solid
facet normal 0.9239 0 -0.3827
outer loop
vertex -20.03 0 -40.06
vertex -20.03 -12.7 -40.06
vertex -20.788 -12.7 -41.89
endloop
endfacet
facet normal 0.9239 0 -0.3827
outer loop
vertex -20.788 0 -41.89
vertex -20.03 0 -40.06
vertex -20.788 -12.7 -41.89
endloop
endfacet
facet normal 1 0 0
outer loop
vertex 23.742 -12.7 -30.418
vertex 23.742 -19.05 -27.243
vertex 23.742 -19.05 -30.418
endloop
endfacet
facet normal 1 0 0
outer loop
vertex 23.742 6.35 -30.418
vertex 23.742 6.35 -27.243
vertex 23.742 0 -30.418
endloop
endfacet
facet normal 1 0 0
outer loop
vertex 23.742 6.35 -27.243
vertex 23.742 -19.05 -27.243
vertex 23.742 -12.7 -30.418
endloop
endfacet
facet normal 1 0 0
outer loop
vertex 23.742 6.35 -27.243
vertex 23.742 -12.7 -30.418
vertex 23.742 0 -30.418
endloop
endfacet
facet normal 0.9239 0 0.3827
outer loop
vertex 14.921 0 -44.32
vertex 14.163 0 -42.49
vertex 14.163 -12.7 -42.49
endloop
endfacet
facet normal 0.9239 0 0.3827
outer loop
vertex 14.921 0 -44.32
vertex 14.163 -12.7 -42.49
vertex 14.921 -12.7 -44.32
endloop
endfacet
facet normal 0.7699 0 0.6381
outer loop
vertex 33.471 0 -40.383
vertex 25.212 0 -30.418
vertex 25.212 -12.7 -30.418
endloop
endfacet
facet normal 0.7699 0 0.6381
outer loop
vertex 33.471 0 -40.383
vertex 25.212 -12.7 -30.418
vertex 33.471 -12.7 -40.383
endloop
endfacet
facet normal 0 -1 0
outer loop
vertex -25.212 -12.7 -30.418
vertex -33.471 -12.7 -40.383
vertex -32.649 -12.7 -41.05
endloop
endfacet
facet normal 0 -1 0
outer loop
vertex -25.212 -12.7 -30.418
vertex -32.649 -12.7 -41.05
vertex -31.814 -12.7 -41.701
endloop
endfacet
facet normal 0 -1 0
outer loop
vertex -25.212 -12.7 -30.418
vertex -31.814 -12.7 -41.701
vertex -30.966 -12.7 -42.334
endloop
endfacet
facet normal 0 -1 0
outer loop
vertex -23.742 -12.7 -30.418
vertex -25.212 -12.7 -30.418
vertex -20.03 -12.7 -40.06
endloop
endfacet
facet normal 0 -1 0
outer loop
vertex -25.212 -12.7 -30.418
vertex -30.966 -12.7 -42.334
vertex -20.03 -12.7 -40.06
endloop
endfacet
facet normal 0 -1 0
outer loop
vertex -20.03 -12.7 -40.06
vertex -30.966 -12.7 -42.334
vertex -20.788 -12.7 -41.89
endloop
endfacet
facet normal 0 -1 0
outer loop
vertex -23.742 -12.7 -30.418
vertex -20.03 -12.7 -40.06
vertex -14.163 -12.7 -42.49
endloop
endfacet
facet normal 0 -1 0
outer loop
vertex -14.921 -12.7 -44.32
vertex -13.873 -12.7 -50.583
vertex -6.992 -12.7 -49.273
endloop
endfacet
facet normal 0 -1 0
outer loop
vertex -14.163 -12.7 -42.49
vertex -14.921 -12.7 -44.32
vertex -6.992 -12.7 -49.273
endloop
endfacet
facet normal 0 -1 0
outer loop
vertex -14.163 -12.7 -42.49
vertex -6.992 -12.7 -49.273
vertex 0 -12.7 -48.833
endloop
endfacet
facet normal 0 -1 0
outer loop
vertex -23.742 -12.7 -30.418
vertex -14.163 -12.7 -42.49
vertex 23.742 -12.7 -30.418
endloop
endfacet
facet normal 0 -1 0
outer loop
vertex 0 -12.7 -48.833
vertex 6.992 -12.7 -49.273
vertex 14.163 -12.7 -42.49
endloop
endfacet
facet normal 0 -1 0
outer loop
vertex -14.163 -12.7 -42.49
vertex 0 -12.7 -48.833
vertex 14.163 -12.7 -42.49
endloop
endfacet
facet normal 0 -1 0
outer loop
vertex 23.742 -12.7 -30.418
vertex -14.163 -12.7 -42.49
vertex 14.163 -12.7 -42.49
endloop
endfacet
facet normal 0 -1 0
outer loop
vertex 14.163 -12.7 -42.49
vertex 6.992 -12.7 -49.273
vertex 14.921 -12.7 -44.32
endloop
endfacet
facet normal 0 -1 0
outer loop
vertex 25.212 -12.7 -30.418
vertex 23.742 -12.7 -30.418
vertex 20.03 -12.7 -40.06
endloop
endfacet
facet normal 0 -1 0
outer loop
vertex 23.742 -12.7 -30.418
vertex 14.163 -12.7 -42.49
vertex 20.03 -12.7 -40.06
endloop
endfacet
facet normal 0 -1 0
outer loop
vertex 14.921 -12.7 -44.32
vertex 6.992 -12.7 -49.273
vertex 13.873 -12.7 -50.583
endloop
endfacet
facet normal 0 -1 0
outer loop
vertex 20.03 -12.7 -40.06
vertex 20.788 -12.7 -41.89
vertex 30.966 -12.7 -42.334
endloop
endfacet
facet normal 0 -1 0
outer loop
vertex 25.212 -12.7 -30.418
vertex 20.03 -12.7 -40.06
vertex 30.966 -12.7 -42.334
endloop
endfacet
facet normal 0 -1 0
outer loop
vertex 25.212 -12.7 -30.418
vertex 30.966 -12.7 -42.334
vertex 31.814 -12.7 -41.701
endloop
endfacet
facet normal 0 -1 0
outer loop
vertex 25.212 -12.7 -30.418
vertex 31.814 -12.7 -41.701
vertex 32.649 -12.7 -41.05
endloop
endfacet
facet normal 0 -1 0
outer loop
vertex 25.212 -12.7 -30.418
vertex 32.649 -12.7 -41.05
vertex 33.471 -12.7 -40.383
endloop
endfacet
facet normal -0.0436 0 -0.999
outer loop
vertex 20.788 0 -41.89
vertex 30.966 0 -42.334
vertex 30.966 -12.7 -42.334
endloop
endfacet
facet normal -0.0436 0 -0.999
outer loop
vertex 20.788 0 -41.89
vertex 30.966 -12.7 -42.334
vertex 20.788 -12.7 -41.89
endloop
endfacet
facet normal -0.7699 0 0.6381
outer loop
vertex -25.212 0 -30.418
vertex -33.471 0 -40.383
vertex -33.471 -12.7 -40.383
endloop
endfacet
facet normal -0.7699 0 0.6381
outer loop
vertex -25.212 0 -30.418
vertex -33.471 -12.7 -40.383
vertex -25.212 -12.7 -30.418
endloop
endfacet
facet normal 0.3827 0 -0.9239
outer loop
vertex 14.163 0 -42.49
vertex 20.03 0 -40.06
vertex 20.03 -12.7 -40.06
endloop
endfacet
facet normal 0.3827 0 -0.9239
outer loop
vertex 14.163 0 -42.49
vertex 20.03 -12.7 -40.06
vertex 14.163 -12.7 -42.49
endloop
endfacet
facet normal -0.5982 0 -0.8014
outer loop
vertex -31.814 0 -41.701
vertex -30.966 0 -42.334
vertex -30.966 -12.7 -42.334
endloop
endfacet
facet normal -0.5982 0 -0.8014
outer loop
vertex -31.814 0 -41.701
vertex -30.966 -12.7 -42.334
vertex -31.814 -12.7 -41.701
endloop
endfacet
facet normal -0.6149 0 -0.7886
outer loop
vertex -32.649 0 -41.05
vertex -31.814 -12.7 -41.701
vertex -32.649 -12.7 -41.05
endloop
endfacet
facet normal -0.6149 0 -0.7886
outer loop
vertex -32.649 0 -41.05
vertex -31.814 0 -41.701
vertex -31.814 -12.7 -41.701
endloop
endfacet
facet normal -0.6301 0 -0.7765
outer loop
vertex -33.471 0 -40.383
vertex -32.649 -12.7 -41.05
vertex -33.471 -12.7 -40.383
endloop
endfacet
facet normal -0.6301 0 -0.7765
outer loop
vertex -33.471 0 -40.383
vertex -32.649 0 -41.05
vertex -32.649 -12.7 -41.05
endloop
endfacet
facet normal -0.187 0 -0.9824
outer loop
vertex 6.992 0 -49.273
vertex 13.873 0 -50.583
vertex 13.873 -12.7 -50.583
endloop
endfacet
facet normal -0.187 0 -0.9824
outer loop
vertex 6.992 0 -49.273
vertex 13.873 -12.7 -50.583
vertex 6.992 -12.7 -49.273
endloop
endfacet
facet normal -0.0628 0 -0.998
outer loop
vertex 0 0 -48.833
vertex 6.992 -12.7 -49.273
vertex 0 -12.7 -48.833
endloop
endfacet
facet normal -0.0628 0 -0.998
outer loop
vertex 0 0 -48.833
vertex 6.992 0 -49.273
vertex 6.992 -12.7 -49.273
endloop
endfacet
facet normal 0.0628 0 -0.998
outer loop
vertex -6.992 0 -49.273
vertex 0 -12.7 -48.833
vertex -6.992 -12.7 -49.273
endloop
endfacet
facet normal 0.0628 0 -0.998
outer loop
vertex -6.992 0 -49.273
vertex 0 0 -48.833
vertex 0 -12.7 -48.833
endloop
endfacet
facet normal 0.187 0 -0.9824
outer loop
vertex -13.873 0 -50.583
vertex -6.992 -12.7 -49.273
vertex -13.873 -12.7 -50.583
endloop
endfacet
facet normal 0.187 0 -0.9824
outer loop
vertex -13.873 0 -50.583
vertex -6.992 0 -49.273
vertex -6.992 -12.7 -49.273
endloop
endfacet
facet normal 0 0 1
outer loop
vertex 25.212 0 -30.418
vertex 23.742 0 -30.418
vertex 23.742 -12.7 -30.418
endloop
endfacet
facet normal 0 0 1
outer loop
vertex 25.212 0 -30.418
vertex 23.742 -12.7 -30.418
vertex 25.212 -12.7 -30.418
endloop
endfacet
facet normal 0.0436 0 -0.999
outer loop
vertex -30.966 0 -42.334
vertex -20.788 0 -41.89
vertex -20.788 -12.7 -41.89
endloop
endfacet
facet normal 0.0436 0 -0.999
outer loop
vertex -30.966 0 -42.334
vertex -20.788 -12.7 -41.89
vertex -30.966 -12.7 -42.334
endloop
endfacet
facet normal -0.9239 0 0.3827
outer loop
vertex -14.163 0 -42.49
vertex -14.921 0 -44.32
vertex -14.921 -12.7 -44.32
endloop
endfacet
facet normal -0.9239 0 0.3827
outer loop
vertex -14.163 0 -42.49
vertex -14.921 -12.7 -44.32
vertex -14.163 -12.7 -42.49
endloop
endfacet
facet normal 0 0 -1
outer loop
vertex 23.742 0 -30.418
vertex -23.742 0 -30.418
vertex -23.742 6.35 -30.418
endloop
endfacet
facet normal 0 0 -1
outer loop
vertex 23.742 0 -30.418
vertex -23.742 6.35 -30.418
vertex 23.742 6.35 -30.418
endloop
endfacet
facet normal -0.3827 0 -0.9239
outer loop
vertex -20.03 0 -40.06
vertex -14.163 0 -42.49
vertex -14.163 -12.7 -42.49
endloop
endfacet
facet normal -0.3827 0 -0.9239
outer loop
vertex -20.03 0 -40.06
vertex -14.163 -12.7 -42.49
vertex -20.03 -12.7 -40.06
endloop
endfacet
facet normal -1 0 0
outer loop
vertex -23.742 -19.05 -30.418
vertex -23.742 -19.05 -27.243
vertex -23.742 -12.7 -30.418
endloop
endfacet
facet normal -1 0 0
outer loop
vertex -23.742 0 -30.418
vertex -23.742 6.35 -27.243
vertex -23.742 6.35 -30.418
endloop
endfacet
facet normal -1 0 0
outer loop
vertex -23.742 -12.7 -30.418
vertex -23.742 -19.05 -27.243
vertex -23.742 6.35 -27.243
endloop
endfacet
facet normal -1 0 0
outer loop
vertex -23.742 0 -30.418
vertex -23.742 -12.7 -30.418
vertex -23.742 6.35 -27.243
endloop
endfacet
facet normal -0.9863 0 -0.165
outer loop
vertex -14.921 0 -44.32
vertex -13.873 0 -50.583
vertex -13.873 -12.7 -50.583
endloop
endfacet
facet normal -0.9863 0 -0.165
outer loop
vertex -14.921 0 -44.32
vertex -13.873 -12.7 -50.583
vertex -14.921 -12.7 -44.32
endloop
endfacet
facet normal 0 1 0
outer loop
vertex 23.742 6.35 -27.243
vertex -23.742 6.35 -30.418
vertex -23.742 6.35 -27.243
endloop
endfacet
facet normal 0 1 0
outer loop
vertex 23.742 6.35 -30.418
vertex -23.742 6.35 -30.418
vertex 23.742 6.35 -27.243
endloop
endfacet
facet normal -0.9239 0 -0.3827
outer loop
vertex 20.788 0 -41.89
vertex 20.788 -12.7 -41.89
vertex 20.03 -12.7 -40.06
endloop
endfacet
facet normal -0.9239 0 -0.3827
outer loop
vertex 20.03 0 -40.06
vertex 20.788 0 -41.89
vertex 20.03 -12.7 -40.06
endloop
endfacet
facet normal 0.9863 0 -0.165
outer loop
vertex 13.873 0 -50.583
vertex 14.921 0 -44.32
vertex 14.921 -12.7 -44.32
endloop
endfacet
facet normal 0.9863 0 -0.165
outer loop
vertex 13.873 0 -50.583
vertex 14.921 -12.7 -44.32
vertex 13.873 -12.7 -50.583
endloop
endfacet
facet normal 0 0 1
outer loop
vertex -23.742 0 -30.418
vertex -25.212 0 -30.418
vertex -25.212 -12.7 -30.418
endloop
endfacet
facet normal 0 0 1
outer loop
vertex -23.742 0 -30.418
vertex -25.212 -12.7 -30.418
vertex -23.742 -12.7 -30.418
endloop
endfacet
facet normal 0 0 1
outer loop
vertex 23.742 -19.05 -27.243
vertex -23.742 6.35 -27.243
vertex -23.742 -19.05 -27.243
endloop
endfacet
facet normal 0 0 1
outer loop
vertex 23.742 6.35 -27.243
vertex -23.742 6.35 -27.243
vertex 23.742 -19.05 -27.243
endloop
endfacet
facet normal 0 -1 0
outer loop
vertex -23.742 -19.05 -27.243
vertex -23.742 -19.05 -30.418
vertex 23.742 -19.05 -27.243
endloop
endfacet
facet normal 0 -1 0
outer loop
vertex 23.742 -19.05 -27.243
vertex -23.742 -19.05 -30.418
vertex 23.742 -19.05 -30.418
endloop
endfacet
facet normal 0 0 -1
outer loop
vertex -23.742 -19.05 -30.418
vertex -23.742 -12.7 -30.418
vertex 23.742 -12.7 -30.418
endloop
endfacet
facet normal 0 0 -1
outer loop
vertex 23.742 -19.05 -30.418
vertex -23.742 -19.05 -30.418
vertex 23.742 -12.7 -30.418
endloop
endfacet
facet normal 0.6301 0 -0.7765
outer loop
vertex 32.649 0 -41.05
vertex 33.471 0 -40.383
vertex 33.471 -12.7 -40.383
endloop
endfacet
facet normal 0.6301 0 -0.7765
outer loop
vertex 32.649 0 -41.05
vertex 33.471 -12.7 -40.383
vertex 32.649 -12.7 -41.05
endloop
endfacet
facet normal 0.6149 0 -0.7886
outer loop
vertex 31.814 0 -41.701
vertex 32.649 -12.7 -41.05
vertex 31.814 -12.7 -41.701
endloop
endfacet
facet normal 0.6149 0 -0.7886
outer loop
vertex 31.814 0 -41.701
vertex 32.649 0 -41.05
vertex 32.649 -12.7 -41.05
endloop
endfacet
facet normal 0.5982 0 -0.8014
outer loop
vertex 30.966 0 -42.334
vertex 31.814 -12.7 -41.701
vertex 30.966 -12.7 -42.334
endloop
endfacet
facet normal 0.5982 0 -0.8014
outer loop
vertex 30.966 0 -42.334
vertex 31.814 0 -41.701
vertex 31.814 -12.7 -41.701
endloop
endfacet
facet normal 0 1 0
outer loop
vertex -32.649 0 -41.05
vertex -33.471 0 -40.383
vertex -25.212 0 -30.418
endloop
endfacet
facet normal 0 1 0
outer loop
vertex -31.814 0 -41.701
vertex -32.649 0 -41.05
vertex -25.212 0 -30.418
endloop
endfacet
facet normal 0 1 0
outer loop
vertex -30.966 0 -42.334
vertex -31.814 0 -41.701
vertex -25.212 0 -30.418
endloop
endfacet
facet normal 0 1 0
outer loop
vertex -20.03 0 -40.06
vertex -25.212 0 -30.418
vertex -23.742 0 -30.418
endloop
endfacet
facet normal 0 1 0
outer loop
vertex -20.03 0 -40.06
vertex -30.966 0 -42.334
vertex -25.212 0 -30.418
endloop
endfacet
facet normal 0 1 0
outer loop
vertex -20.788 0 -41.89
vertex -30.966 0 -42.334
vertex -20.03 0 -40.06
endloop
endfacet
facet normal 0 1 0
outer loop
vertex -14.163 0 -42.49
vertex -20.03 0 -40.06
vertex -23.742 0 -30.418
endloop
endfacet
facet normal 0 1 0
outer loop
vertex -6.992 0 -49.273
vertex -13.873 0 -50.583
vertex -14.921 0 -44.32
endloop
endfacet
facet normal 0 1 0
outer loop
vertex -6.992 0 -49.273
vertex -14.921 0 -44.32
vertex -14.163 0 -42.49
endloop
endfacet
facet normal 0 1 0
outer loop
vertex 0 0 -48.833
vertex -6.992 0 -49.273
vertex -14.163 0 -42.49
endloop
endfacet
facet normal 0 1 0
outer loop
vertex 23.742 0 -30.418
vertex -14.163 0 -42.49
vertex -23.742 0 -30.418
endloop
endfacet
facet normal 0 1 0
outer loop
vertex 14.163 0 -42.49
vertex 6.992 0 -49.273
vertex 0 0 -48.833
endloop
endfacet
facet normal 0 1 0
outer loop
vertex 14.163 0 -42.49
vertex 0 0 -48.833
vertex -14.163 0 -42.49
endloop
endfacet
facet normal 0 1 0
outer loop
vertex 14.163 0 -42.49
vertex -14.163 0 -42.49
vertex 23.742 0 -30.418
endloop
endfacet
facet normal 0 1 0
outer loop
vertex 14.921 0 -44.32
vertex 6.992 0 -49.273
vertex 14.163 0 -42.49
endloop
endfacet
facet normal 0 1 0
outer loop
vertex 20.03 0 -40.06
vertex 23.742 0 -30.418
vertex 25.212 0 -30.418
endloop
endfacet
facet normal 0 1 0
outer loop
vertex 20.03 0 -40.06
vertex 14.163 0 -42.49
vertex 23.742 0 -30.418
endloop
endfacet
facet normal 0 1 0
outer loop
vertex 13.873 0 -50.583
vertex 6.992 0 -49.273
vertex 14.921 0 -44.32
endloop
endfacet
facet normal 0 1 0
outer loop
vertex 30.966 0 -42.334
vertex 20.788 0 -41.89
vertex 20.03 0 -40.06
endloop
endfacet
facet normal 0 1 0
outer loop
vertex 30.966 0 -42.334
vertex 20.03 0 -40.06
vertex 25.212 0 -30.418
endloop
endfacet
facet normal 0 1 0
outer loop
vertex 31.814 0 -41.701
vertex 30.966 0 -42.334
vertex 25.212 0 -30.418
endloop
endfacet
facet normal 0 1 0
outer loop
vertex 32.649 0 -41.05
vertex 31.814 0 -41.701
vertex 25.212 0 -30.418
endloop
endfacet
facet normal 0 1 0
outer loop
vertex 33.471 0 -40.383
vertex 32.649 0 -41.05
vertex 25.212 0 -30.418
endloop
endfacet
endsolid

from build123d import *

# Parameters (mm, degrees)
BOSS_EXTRUDE1_DEPTH = 12.7
SKETCH1_5_W         = 47.483470806
SKETCH1_5_H         = 3.175
BOSS_EXTRUDE2_DEPTH = 6.35
SKETCH1_6_W         = 47.483470806
SKETCH1_6_H         = 3.175
BOSS_EXTRUDE3_DEPTH = 19.05


with BuildPart() as part:
    # Sketch1 → Boss-Extrude1 (new body)
    with BuildSketch(Plane(origin=(0, 0, 0), x_dir=(1, 0, 0), z_dir=(0, 1, 0))):
        with BuildLine():
            Line((25.211738376, 30.418429692), (33.470890643, 40.38325))
            ThreePointArc((33.470890643, 40.38325), (32.233303271, 41.377790676), (30.966181765, 42.334418478))
            Line((30.966181765, 42.334418478), (20.788013819, 41.890030069))
            Line((20.788013819, 41.890030069), (20.029841402, 40.059639939))
            Line((20.029841402, 40.059639939), (14.163206371, 42.489679735))
            Line((14.163206371, 42.489679735), (14.921378787, 44.320069864))
            Line((14.921378787, 44.320069864), (13.87332649, 50.582983434))
            ThreePointArc((13.87332649, 50.582983434), (0, 48.833429692), (-13.87332649, 50.582983434))
            Line((-13.87332649, 50.582983434), (-14.921378787, 44.320069864))
            Line((-14.921378787, 44.320069864), (-14.163206371, 42.489679735))
            Line((-14.163206371, 42.489679735), (-20.029841402, 40.059639939))
            Line((-20.029841402, 40.059639939), (-20.788013819, 41.890030069))
            Line((-20.788013819, 41.890030069), (-30.966181765, 42.334418478))
            ThreePointArc((-30.966181765, 42.334418478), (-32.233303271, 41.377790676), (-33.470890643, 40.38325))
            Line((-33.470890643, 40.38325), (-25.211738376, 30.418429692))
            Line((-25.211738376, 30.418429692), (25.211738376, 30.418429692))
        make_face()
    extrude(amount=-BOSS_EXTRUDE1_DEPTH)



with BuildPart() as body_2:
    # Sketch1<5> → Boss-Extrude2 (new body)
    with BuildSketch(Plane(origin=(0, 0, 0), x_dir=(1, 0, 0), z_dir=(0, 1, 0))):
        with Locations((0, 28.830929692)):
            Rectangle(SKETCH1_5_W, SKETCH1_5_H)
    extrude(amount=BOSS_EXTRUDE2_DEPTH)


with BuildPart() as part_1:
    add(part.part)

    add(body_2.part)  # Boss-Extrude3 merges body 2
    # Sketch1<6> → Boss-Extrude3 (add)
    with BuildSketch(Plane(origin=(0, 0, 0), x_dir=(1, 0, 0), z_dir=(0, 1, 0))):
        with Locations((0, 28.830929692)):
            Rectangle(SKETCH1_6_W, SKETCH1_6_H)
    extrude(amount=-BOSS_EXTRUDE3_DEPTH)


solid = part_1.part
